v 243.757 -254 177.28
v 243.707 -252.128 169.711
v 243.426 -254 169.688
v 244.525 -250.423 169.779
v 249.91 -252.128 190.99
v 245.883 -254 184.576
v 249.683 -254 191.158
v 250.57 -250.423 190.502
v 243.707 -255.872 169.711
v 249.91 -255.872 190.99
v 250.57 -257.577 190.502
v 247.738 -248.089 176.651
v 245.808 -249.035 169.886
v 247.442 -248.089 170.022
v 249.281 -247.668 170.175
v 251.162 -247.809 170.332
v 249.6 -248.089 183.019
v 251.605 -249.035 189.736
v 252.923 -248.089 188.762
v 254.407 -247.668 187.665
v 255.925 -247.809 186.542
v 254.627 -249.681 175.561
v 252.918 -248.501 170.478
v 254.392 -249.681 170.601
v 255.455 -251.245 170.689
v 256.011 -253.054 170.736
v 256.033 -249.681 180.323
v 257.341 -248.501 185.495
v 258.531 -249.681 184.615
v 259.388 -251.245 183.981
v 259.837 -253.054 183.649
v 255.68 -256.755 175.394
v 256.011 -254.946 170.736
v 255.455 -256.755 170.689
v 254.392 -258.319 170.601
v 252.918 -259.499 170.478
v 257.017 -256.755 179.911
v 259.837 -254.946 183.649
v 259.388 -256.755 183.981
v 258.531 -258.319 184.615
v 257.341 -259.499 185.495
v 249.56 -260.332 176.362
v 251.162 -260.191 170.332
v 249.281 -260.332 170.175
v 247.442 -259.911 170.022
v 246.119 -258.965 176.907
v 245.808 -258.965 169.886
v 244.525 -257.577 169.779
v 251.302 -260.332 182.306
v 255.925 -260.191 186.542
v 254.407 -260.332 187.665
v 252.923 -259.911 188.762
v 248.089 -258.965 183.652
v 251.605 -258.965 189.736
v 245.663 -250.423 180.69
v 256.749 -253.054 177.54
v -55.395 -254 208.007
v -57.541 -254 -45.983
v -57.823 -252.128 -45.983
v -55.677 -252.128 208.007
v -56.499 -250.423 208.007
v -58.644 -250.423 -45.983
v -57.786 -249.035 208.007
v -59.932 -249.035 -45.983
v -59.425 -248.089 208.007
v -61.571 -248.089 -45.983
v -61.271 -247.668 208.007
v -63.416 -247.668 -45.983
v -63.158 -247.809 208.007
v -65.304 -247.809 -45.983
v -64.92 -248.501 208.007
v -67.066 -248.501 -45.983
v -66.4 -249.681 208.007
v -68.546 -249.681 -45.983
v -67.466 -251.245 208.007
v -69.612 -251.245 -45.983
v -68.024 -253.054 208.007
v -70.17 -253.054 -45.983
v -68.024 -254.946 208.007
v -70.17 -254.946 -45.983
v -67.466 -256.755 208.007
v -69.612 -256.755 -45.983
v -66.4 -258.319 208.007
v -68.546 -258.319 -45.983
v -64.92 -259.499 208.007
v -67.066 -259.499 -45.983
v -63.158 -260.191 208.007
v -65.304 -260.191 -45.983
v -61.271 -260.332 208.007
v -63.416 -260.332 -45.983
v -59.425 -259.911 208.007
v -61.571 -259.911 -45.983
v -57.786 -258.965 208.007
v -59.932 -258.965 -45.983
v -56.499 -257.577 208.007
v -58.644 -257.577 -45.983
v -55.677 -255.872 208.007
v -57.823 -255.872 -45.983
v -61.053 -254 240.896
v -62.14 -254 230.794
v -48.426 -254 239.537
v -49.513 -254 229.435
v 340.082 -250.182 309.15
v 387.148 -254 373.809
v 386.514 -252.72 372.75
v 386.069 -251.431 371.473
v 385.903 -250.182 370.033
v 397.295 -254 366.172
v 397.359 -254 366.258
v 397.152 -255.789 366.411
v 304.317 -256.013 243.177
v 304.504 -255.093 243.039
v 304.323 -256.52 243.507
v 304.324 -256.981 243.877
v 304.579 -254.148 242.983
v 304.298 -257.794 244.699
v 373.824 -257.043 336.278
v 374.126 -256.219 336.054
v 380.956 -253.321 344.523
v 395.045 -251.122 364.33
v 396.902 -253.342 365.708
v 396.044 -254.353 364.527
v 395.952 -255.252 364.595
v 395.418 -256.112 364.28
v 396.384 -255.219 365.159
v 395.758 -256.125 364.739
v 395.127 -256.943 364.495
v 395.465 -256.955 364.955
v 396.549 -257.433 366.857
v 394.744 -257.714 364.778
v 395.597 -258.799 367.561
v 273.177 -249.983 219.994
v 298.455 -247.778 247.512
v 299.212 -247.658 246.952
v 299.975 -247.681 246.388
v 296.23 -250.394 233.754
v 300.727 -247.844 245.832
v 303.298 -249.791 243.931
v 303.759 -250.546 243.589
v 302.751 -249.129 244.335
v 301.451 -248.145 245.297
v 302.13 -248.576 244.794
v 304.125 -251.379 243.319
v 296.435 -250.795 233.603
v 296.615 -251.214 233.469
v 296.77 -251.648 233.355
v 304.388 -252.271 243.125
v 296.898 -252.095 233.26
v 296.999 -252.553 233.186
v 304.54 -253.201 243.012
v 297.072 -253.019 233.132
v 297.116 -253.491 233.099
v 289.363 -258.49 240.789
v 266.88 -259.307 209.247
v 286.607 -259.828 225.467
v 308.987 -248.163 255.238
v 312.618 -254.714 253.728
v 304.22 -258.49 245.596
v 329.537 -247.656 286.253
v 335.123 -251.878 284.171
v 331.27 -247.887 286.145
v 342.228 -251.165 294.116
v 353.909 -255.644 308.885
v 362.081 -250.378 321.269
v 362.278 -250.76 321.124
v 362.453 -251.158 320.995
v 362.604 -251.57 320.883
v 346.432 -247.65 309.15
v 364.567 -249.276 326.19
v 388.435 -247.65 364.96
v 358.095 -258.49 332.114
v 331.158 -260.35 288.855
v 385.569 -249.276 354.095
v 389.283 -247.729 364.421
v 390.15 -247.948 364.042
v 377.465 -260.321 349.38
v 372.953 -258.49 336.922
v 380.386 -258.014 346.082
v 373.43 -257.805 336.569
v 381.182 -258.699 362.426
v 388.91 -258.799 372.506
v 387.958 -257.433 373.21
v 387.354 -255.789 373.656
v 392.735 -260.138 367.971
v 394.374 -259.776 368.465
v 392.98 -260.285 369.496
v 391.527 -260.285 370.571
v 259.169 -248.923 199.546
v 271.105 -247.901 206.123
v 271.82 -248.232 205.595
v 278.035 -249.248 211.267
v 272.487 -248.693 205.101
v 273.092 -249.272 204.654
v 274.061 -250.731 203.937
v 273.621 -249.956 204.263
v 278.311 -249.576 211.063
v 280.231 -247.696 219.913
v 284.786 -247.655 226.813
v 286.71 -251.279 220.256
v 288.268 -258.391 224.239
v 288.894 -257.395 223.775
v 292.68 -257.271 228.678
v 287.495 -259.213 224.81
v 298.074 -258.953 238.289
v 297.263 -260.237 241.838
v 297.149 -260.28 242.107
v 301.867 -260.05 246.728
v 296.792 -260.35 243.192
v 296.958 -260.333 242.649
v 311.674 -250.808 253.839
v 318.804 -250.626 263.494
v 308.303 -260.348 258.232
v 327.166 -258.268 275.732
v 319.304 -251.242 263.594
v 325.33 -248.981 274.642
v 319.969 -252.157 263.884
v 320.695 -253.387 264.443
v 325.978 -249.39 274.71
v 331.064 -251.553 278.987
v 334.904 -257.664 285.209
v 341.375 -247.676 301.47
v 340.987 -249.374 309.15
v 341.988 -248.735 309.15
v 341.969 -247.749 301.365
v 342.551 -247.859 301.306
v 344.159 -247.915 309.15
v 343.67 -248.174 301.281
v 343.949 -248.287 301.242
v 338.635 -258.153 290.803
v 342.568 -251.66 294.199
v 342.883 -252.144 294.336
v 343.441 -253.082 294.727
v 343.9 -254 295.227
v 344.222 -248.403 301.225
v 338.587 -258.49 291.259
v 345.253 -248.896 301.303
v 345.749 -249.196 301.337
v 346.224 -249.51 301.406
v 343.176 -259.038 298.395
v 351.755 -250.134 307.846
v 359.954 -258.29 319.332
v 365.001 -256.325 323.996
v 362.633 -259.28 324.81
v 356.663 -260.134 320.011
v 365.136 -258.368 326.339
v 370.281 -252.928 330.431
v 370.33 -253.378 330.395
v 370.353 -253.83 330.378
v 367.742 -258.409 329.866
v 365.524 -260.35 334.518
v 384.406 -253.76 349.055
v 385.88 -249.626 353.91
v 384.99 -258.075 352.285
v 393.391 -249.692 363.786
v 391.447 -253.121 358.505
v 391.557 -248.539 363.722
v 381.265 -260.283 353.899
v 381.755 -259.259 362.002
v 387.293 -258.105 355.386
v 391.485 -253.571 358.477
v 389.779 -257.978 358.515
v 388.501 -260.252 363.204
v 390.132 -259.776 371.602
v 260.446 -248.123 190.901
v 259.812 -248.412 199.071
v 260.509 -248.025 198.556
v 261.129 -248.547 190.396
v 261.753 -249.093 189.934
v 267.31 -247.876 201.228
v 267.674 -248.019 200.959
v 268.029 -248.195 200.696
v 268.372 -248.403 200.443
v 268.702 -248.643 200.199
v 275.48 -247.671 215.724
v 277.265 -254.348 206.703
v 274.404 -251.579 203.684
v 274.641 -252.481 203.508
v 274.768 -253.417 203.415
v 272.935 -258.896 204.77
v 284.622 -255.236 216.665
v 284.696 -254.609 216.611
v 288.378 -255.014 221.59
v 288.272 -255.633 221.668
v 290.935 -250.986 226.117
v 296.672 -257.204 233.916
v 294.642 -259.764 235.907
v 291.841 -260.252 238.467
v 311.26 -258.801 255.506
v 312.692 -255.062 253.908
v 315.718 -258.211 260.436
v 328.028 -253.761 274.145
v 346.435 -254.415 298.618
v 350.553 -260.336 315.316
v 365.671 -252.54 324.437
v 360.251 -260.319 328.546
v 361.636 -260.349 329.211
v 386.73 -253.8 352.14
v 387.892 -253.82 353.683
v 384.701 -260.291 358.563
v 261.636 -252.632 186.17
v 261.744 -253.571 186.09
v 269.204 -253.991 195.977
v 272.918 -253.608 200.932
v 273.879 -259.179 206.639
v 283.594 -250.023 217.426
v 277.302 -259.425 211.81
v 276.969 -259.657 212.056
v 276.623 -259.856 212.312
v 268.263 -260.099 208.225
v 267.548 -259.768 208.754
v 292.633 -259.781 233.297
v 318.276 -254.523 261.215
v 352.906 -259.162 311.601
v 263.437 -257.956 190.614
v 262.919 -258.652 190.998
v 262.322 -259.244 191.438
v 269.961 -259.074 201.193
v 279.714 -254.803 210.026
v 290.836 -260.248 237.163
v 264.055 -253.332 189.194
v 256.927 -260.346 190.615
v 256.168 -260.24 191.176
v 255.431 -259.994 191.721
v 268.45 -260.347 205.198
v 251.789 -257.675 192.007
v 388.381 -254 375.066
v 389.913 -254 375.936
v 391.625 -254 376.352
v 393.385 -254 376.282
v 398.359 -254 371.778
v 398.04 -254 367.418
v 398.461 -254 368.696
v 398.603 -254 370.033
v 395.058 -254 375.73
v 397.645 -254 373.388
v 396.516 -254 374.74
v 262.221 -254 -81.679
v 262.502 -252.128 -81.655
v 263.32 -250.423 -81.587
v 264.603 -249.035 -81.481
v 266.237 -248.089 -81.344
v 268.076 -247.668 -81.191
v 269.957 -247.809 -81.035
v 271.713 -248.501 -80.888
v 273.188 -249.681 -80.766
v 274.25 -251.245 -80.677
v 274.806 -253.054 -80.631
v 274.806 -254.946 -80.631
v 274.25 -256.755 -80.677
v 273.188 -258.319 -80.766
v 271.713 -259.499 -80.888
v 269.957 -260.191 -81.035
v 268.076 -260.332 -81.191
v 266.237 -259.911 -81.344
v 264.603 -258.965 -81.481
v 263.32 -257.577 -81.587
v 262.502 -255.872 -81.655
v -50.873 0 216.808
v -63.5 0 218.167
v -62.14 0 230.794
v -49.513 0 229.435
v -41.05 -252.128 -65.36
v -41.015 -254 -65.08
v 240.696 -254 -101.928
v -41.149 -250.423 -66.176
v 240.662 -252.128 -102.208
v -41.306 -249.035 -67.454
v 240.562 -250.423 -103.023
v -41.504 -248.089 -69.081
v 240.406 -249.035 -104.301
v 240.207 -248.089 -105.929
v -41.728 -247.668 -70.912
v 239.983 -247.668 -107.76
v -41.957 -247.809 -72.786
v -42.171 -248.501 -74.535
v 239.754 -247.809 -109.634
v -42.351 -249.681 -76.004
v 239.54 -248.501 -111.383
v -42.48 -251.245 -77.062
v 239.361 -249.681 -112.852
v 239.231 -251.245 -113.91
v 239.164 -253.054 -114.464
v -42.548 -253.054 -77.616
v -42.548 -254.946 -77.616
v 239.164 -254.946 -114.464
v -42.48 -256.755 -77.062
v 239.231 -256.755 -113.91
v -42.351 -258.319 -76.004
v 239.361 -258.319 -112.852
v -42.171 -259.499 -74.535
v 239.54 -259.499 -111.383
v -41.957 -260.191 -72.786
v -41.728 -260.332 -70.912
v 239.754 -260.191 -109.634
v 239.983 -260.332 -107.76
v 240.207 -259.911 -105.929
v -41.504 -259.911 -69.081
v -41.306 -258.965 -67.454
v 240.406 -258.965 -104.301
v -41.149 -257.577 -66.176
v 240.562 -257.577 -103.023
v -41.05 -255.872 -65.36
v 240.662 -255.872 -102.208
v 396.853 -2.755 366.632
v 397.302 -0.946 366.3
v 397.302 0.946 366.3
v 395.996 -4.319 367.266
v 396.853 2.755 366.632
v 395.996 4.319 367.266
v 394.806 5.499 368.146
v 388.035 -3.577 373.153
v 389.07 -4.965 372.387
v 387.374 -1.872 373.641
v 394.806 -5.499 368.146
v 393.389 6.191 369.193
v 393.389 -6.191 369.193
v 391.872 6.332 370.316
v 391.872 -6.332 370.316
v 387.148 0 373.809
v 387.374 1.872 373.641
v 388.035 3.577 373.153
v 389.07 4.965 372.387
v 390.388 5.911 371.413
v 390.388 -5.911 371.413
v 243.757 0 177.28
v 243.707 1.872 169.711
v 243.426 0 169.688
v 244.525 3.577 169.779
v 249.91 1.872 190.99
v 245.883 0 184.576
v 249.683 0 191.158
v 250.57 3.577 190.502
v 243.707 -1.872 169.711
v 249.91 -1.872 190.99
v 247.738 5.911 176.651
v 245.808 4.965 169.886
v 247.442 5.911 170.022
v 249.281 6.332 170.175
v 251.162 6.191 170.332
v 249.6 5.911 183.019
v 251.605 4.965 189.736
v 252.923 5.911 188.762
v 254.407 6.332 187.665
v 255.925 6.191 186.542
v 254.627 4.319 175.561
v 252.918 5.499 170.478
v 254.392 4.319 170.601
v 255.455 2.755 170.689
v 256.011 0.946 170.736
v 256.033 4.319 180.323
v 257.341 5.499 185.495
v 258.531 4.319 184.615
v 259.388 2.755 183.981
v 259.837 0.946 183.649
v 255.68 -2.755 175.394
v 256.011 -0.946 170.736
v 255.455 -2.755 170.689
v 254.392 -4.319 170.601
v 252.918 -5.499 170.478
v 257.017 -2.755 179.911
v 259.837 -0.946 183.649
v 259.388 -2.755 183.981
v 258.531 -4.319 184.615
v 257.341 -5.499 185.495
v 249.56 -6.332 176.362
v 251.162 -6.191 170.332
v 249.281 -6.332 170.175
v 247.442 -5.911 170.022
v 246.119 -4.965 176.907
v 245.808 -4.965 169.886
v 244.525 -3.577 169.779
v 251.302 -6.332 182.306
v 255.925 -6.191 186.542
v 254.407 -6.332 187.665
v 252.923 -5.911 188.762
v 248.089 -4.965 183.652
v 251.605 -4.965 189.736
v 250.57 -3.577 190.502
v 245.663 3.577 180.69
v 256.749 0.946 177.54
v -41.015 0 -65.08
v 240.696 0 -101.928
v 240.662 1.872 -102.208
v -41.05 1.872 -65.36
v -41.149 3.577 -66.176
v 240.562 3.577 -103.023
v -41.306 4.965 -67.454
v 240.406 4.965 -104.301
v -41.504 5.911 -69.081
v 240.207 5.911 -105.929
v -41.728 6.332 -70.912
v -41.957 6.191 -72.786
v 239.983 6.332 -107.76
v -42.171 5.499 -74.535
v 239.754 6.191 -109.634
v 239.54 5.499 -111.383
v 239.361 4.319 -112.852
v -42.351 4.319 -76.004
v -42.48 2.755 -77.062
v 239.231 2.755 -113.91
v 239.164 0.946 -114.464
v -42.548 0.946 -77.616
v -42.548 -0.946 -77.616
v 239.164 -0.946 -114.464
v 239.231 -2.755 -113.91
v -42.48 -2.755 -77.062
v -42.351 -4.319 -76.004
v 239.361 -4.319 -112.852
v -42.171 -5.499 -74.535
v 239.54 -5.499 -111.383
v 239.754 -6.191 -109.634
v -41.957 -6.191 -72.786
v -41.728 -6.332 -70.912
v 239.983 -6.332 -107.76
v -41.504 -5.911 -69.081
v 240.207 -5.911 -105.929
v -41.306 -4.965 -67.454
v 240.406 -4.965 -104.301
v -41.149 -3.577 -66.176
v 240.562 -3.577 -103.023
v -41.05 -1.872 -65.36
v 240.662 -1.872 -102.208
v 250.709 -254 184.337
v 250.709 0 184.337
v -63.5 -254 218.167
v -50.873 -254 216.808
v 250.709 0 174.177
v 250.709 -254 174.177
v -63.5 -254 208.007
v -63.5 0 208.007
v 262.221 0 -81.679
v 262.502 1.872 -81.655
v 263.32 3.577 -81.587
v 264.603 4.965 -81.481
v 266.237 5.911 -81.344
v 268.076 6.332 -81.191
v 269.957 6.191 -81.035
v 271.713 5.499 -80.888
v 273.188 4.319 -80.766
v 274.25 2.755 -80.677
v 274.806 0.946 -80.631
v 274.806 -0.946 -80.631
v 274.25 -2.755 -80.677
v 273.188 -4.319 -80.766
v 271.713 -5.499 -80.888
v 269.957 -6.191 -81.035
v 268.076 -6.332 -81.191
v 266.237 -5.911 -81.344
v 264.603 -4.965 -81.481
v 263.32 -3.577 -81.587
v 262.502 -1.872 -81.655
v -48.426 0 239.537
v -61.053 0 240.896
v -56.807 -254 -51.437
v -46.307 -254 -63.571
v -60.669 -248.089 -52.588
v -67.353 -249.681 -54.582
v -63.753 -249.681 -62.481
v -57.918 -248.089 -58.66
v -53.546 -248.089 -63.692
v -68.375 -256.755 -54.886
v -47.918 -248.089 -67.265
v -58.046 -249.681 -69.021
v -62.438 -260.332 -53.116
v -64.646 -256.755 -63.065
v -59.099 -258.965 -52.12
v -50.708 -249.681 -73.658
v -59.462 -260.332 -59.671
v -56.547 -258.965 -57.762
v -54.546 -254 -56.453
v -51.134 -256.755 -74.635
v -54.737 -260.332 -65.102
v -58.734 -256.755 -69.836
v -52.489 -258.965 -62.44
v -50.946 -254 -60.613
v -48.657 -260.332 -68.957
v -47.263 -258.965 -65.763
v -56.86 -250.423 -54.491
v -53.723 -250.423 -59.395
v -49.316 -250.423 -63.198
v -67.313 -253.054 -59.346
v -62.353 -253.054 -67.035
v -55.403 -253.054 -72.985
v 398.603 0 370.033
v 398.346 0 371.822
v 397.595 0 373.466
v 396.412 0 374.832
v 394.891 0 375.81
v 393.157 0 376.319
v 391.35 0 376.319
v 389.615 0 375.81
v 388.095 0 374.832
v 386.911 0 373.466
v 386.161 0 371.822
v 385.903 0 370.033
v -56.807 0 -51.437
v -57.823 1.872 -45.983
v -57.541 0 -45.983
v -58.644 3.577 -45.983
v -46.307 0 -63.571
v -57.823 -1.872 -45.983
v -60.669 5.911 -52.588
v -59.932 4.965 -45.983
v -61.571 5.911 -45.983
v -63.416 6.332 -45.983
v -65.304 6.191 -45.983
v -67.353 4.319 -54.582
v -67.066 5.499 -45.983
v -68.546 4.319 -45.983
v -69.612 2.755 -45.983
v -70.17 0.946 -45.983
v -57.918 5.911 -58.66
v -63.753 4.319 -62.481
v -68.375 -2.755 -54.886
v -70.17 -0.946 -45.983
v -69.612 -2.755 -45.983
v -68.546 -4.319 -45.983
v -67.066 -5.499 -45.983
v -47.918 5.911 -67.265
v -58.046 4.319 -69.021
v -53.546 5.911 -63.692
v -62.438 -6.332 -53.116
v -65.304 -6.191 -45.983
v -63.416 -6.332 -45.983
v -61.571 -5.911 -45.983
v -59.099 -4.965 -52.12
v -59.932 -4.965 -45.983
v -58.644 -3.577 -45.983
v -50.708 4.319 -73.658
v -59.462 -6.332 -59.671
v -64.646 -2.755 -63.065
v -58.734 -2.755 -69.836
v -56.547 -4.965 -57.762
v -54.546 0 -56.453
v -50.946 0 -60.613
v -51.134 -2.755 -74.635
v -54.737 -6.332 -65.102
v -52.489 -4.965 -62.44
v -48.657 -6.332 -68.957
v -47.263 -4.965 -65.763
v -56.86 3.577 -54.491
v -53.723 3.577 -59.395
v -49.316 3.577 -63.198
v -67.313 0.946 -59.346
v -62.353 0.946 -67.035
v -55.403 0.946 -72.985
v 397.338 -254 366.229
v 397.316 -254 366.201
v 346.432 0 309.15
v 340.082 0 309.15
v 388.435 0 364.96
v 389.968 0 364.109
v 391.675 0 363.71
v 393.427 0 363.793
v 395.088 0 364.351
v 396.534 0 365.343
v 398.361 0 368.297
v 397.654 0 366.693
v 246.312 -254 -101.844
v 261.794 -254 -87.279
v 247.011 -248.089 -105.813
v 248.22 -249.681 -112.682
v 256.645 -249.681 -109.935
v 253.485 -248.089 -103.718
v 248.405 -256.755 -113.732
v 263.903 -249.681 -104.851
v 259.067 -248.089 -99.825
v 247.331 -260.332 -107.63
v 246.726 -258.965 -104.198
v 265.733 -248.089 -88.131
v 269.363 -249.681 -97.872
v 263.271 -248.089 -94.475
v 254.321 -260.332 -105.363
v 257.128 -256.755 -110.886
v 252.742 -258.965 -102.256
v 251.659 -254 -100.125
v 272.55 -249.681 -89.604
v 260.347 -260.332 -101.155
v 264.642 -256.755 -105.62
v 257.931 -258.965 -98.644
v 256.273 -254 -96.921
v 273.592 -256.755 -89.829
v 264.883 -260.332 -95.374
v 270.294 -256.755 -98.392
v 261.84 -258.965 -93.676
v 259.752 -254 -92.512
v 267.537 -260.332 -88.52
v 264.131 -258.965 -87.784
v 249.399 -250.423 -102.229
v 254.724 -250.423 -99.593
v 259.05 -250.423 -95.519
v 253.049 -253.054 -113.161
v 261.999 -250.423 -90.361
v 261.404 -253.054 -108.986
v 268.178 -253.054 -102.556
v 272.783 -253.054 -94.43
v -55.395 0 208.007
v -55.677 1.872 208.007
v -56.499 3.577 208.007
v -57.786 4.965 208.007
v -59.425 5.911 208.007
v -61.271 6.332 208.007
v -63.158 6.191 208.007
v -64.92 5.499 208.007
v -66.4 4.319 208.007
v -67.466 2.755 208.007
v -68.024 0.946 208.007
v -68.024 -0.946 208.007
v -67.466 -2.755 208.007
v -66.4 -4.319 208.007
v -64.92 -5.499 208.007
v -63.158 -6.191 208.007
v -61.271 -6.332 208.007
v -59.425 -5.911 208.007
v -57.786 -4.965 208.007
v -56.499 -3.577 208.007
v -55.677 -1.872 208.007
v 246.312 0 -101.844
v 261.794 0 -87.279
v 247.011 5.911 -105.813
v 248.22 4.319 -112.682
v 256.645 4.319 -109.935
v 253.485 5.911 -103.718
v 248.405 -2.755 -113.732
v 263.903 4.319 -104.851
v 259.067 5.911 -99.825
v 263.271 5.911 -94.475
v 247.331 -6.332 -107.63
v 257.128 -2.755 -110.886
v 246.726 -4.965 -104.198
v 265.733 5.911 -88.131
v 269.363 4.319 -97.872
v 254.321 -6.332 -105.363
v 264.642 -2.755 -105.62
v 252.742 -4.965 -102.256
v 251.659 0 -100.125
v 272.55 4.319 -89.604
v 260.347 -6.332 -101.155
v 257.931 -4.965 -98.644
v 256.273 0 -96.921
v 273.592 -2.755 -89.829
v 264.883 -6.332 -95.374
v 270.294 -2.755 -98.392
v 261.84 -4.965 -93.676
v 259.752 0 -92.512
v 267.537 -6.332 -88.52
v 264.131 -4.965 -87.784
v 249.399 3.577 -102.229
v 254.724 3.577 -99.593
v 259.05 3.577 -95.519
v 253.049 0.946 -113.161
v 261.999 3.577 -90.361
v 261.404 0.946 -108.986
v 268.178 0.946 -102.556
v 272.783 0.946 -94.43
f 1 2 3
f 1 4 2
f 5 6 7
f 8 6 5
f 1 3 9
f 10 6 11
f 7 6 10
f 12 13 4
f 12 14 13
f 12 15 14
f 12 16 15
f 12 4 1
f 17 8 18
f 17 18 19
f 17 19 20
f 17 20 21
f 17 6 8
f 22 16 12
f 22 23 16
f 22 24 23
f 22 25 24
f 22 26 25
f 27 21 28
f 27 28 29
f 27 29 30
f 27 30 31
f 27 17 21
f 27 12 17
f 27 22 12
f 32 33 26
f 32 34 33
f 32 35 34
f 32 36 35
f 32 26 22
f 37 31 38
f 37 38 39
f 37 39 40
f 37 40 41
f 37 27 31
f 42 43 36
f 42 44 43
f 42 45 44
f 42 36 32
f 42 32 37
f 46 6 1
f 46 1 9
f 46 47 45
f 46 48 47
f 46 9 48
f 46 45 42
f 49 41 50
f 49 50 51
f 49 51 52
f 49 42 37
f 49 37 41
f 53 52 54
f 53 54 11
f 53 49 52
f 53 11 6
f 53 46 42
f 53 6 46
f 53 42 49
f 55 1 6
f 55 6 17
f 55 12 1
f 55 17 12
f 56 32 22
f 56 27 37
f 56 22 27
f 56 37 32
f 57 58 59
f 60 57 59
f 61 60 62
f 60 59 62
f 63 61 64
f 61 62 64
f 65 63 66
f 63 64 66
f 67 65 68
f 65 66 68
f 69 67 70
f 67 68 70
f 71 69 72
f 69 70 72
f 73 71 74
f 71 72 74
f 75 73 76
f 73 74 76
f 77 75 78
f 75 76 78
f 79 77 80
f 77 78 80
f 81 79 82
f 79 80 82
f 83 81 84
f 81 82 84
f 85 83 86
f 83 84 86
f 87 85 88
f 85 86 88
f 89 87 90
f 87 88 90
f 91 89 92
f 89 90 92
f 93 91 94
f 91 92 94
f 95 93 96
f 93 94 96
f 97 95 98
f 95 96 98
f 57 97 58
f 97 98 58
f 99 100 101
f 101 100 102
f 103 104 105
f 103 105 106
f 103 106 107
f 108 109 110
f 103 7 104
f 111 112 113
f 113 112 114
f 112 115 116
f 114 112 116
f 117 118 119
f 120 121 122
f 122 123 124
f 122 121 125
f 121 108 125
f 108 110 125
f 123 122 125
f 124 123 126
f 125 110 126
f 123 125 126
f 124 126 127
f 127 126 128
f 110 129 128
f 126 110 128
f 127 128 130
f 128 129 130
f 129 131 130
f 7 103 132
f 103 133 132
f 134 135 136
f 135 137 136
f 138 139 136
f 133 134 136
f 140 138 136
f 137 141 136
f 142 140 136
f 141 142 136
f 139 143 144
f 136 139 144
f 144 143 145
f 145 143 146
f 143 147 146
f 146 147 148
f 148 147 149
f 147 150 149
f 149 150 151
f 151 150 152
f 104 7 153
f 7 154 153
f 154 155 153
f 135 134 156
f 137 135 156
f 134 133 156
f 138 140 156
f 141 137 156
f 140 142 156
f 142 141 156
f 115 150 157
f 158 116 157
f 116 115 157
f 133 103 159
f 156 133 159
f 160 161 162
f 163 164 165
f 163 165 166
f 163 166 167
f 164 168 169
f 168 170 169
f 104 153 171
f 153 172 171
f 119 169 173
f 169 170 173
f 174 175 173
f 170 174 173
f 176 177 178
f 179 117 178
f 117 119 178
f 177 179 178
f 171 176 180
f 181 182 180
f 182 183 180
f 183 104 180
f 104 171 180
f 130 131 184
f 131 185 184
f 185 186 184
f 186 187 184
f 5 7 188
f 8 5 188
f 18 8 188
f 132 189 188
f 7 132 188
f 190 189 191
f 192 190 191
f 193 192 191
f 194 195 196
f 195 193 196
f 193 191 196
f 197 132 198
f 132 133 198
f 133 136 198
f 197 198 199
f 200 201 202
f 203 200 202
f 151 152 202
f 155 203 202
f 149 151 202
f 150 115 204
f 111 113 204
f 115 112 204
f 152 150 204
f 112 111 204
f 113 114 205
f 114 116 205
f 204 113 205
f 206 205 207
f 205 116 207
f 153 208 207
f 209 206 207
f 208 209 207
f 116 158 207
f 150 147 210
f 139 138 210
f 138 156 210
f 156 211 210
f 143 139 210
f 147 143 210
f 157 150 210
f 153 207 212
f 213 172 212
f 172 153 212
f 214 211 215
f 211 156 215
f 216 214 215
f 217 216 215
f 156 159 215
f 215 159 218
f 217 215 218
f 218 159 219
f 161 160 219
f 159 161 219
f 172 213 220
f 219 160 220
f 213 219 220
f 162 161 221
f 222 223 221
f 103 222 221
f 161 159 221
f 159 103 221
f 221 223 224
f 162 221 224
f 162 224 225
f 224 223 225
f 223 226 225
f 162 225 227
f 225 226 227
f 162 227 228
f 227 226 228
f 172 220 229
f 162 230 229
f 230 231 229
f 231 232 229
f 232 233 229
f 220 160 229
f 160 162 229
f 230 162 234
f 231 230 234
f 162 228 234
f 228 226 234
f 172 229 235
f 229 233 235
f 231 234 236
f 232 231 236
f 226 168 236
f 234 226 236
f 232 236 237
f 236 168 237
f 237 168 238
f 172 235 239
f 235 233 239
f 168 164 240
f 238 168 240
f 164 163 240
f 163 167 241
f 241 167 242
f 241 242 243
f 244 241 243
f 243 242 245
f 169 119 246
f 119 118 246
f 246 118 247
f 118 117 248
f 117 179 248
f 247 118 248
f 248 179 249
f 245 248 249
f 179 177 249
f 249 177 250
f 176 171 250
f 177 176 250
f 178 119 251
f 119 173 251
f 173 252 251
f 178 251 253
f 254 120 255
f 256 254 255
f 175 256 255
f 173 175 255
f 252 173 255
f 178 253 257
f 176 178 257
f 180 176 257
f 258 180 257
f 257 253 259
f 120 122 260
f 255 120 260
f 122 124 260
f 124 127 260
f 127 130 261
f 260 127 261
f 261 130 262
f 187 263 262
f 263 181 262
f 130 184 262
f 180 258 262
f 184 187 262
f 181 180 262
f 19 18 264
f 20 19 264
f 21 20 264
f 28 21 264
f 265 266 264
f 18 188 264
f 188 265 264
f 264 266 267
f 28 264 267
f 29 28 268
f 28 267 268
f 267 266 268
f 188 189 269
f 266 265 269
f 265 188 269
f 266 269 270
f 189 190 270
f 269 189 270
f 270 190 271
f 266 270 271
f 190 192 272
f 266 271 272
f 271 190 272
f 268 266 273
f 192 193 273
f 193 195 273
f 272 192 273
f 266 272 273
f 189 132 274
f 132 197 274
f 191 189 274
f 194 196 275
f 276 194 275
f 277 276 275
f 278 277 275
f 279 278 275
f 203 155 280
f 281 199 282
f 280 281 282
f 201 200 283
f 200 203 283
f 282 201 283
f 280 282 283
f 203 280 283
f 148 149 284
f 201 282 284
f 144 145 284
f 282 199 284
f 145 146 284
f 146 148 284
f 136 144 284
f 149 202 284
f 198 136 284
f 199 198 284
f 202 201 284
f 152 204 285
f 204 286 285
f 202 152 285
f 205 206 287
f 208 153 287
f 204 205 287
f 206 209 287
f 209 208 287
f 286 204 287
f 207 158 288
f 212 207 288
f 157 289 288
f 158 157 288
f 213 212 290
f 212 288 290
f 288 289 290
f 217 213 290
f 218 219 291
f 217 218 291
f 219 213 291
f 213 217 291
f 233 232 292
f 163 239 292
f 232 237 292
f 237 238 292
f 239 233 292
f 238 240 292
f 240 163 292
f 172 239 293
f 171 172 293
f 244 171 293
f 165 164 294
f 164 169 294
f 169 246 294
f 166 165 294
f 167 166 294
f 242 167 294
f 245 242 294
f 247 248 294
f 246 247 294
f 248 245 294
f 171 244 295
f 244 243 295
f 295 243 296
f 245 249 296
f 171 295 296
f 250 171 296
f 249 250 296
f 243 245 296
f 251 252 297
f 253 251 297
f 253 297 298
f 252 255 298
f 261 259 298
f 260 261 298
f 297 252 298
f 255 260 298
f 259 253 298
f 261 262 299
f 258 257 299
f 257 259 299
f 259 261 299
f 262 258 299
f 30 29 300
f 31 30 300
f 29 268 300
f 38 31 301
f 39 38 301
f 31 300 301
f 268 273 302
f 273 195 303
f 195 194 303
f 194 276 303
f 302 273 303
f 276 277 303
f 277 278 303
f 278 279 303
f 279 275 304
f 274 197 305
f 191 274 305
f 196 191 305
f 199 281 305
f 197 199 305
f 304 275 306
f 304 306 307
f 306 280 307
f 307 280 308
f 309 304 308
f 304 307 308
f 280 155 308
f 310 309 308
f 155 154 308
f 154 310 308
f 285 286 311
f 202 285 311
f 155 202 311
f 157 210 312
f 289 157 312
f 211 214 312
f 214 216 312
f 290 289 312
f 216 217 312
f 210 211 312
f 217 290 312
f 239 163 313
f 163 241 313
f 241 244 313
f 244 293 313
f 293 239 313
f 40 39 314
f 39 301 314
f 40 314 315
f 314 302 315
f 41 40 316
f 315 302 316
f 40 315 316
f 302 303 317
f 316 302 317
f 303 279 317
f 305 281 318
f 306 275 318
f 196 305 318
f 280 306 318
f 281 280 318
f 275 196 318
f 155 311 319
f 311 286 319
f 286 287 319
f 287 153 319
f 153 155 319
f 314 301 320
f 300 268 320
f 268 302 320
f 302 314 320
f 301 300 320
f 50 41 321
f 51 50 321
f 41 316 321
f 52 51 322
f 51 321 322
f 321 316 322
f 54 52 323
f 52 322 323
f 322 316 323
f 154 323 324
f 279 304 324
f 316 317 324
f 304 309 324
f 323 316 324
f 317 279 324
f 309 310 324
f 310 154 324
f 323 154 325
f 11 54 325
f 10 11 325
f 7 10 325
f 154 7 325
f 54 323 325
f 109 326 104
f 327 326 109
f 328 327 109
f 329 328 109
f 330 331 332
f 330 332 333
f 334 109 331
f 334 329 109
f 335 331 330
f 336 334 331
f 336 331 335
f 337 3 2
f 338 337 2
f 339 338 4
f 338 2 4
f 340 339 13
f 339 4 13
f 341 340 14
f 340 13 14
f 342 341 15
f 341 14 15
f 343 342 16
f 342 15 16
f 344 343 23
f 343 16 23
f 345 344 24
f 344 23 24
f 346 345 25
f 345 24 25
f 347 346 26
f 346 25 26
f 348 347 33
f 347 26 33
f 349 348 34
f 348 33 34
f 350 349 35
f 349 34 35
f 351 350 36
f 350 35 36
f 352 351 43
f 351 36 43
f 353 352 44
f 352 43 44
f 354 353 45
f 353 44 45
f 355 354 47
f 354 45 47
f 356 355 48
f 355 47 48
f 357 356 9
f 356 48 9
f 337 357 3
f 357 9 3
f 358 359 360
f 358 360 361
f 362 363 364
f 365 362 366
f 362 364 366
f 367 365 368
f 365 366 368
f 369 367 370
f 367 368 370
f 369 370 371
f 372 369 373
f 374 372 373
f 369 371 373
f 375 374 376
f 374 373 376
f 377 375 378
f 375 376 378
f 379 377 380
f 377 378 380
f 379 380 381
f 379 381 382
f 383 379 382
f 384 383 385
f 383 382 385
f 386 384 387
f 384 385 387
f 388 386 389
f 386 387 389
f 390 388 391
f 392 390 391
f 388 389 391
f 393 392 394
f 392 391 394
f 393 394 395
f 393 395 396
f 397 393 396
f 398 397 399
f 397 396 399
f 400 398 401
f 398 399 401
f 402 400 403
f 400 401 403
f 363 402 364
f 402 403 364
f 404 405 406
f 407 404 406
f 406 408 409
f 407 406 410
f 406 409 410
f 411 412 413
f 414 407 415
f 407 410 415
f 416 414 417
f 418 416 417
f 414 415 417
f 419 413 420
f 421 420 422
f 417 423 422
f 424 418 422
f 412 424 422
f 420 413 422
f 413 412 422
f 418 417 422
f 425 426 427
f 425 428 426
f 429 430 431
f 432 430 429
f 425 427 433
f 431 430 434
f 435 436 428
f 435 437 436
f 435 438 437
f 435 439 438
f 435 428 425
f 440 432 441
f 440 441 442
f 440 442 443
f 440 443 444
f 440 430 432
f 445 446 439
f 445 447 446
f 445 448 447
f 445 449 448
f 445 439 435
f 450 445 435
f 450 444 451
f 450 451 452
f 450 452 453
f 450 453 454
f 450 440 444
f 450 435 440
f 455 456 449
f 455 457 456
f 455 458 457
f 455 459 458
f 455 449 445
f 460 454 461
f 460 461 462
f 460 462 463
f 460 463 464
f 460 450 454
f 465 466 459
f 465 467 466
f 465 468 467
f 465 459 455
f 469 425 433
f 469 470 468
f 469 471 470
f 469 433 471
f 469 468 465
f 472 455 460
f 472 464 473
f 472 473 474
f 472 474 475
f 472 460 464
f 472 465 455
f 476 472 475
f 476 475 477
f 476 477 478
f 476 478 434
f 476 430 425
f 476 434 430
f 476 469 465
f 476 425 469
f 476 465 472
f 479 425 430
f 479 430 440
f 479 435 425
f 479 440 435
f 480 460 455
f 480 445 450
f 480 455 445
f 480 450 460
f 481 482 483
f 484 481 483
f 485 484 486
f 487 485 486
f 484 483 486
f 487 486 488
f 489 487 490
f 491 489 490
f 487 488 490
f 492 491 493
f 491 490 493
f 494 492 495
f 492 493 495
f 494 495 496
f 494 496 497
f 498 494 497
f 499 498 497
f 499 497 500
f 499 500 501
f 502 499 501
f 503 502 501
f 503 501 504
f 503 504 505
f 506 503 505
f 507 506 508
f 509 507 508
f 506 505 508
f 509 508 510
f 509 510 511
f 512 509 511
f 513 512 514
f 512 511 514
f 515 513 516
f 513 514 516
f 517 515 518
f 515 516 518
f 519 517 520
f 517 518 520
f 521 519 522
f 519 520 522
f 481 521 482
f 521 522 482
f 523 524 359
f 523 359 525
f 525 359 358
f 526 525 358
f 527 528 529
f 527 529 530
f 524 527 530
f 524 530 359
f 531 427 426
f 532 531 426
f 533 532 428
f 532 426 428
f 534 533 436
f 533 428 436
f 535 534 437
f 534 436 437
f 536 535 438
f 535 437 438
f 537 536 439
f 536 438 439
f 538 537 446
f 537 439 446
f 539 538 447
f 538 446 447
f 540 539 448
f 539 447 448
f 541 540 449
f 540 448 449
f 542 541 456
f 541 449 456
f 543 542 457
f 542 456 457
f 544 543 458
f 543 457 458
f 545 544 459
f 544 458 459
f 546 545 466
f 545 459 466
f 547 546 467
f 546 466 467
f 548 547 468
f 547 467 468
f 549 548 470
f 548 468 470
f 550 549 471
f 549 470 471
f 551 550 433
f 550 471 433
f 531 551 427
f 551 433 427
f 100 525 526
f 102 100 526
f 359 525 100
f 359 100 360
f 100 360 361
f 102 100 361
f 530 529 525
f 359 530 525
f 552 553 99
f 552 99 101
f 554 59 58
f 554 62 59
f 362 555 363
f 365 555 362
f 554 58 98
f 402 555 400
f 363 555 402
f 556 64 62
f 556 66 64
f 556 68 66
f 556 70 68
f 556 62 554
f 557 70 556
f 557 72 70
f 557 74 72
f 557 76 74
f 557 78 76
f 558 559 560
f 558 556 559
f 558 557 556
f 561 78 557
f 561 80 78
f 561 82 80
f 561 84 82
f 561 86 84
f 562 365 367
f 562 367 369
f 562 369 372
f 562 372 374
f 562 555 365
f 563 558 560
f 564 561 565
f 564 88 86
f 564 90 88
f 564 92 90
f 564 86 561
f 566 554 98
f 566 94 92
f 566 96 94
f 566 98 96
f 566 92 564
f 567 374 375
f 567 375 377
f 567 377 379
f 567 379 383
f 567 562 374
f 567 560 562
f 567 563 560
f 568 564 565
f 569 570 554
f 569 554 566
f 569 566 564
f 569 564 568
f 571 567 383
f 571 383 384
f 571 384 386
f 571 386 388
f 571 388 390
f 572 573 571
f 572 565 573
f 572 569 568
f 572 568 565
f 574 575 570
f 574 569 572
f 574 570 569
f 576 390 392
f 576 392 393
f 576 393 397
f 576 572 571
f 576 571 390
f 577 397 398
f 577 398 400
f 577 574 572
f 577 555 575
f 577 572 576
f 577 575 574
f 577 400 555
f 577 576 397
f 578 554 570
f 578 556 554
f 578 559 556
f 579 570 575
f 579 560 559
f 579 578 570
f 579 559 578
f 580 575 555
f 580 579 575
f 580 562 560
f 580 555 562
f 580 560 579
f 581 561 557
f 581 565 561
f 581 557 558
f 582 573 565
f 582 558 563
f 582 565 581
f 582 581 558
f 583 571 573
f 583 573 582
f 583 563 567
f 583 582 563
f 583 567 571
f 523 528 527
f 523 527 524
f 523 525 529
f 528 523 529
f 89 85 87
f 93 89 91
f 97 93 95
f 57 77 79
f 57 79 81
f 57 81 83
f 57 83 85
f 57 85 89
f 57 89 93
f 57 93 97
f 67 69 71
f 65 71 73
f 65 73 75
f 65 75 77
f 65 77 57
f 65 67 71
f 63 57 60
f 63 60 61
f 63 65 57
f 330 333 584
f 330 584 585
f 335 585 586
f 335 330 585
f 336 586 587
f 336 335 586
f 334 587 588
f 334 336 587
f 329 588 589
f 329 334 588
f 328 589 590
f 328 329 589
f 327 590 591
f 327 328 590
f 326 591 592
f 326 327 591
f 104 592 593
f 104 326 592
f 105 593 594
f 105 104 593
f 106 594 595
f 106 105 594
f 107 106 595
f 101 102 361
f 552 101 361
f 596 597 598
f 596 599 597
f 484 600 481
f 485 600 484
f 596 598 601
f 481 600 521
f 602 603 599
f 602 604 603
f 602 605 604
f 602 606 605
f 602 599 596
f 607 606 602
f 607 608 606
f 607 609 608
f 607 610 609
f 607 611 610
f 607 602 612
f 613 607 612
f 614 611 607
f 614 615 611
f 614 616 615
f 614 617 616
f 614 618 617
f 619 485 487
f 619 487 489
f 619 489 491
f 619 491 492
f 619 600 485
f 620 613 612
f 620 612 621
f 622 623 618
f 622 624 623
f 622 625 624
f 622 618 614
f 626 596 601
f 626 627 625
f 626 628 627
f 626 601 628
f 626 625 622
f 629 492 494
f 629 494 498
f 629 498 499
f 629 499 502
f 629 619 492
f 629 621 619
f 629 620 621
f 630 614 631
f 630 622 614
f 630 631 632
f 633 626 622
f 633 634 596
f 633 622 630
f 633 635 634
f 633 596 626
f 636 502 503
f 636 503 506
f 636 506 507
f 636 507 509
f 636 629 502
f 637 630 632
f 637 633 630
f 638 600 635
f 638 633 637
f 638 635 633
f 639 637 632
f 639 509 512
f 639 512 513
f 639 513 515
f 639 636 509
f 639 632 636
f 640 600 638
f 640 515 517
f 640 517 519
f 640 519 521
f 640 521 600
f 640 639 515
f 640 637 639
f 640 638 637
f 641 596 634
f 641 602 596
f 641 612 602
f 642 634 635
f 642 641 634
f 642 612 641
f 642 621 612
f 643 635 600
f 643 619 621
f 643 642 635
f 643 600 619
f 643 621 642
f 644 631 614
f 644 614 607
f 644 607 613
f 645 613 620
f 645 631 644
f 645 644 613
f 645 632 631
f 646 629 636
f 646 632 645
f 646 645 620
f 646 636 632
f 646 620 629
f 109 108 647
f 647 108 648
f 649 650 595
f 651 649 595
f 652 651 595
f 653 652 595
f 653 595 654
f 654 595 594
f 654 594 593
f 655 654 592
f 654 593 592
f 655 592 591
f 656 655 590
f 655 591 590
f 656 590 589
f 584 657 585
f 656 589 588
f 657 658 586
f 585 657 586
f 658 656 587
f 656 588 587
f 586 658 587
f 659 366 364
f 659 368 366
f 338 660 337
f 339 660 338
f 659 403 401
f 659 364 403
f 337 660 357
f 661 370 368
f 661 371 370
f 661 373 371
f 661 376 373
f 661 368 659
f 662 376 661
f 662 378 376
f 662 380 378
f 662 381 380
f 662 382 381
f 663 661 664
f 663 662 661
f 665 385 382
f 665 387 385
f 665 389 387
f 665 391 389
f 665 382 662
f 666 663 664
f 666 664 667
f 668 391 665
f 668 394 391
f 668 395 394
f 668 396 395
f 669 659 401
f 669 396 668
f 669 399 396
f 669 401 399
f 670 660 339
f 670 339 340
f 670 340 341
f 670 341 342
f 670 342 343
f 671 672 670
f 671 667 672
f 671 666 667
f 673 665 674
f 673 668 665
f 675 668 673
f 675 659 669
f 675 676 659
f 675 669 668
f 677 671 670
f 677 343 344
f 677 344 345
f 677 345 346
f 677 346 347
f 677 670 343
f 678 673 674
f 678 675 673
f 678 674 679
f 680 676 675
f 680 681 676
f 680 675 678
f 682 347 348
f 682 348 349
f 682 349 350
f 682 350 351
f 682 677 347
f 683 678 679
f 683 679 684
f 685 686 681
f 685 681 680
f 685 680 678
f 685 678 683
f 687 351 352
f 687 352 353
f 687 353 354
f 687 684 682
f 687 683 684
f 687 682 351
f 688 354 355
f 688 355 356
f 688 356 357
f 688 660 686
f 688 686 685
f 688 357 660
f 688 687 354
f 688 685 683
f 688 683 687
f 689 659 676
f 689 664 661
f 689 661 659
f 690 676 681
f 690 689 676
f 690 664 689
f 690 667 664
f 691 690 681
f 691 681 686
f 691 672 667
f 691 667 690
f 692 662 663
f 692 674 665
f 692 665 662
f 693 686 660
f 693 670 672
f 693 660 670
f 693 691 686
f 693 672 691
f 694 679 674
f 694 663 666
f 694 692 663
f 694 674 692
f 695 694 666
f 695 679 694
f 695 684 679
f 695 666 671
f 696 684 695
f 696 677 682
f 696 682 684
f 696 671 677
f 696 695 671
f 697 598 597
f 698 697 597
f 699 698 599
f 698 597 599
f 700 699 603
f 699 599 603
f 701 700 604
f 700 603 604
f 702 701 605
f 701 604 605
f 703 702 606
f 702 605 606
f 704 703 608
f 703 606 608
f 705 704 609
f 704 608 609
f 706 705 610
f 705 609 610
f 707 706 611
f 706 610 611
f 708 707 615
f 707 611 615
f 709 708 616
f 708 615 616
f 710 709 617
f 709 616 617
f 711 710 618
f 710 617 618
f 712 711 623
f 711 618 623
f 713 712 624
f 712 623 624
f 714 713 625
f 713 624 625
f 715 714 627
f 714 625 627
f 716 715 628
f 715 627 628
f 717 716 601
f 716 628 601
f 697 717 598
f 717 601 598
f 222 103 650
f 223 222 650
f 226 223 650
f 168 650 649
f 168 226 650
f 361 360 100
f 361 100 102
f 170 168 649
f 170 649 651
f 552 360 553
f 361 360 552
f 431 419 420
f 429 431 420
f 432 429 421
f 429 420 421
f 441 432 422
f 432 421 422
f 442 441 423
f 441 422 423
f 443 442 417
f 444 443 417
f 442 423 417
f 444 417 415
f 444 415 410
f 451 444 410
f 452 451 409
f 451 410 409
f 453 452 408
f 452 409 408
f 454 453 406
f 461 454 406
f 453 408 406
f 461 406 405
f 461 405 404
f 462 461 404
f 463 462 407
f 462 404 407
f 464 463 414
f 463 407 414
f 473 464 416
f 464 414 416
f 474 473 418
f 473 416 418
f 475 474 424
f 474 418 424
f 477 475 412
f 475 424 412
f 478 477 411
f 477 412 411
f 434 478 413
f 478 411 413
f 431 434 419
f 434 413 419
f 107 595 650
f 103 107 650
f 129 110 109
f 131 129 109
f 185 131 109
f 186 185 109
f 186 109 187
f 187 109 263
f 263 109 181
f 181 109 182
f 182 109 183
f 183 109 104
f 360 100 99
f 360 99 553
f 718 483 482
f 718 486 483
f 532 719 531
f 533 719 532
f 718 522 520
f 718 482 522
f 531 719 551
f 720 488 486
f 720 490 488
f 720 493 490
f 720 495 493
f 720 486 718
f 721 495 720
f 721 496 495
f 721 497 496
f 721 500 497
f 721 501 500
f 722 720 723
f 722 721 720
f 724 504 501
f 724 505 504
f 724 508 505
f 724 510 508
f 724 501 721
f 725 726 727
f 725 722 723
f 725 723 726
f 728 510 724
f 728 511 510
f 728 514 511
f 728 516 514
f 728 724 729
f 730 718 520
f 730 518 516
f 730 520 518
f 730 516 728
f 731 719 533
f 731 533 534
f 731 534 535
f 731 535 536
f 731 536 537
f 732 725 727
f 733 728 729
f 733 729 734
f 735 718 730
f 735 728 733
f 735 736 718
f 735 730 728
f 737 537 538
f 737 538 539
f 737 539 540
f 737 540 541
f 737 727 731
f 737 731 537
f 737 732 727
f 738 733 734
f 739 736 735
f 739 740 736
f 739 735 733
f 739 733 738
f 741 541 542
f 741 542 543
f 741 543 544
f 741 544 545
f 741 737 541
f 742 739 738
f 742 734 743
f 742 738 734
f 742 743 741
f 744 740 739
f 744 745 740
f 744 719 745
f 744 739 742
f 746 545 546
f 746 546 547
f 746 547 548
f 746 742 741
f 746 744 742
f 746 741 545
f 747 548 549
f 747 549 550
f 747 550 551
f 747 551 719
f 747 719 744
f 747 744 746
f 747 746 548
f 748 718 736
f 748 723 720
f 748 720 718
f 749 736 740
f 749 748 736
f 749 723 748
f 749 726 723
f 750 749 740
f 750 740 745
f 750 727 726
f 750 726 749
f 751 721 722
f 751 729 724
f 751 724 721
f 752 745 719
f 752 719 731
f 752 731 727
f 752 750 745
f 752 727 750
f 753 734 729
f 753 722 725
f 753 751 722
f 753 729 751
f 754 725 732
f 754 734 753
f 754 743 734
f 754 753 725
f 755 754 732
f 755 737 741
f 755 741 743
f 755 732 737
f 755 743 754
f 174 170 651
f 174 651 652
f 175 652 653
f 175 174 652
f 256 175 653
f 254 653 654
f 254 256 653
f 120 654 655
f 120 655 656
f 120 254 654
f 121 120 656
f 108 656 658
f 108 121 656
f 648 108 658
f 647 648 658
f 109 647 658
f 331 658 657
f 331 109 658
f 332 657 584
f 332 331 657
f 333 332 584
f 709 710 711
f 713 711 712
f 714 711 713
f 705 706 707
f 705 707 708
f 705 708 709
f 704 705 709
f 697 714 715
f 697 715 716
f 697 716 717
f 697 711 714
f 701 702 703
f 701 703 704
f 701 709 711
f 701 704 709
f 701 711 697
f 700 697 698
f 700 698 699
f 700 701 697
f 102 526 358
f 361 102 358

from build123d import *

# Parameters (mm, degrees)
F4_R      = 6.35
F6_R      = 6.35
F8_DEPTH  = 254
F10_W     = 254
F10_H     = 10.16
F14_DEPTH = 254
F15_W     = 12.7
F15_H     = 254
F16_DEPTH = 12.7
F17_W     = 12.7
F17_H     = 254
F18_DEPTH = 10.16


with BuildPart() as f5:
    # F5: sweep along a path in F1
    with BuildLine(Plane.XZ) as f5_path:
        Line((-61.7453475377, 208.0074561836), (-63.8906607053, -45.9834838741))
        ThreePointArc((-63.8906607053, -45.9834838741), (-57.6518689096, -62.872631205), (-41.7858294707, -71.3834838741))
        Line((-41.7858294707, -71.3834838741), (239.9254137755, -108.2313532754))
        ThreePointArc((239.9254137755, -108.2313532754), (260.675596222, -101.4971953394), (268.5489681957, -81.1519509704))
        Line((268.5489681957, -81.1519509704), (249.7536663039, 170.2146638692))
        ThreePointArc((249.7536663039, 170.2146638692), (250.7094665663, 179.2565284944), (254.7884130124, 187.38247865))
        Line((254.7884130124, 187.38247865), (392.253343443, 370.0333831145))
    # F4 (on offset) → F5 (sweep)
    with BuildSketch(Plane.XY.offset(208.007458)):
        with Locations((-61.7453475377, 0)):
            Circle(F4_R)
    sweep(path=f5_path.line)


with BuildPart() as f7:
    # F7: sweep along a path in F2
    with BuildLine(Plane.XZ.offset(254)) as f7_path:
        Line((-61.7453475377, 208.0074561836), (-63.8906607053, -45.9834838741))
        ThreePointArc((-63.8906607053, -45.9834838741), (-57.6518689096, -62.872631205), (-41.7858294707, -71.3834838741))
        Line((-41.7858294707, -71.3834838741), (239.9254137755, -108.2313532754))
        ThreePointArc((239.9254137755, -108.2313532754), (260.675596222, -101.4971953394), (268.5489681957, -81.1519509704))
        Line((268.5489681957, -81.1519509704), (249.7536663039, 170.2146638692))
        ThreePointArc((249.7536663039, 170.2146638692), (250.7094665663, 179.2565284944), (254.7884130124, 187.38247865))
        Line((254.7884130124, 187.38247865), (392.253343443, 370.0333831145))
    # F6 (on offset) → F7 (sweep)
    with BuildSketch(Plane.XY.offset(208.007458)):
        with Locations((-61.7453475377, -254)):
            Circle(F6_R)
    sweep(path=f7_path.line)

    # F2 (on offset) → F8 (join)
    with BuildSketch(Plane.XZ.offset(254)):
        with BuildLine():
            ThreePointArc((388.4348731532, 364.9597468793), (395.0884107843, 364.3514034269), (398.603343443, 370.0333831145))
            ThreePointArc((398.603343443, 370.0333831145), (389.4182761016, 375.715362802), (388.4348731532, 364.9597468793))
        make_face()
    extrude(amount=-F8_DEPTH)

    # F13 (on face) → F14 (join)
    with BuildSketch(Plane.XZ.offset(254)):
        Polygon((392.253343443, 370.0333831145), (385.903343443, 370.0333831145), (340.0816999661, 309.149748293), (346.4316999661, 309.149748293), align=None)
    extrude(amount=-F14_DEPTH)


with BuildPart() as f12:
    # F12: sweep along a path in F11
    with BuildLine(Plane.XZ) as f12_path:
        Line((-63.5, 213.0874561836), (250.7094665663, 179.2565284944))
    # F10 (on offset) → F12 (sweep)
    with BuildSketch(Plane.YZ.offset(-63.5)):
        with Locations((-127, 213.0874561836)):
            Rectangle(F10_W, F10_H)
    sweep(path=f12_path.line)


with BuildPart() as f16:
    # F15 (on face) → F16 (new body)
    with BuildSketch(Plane(origin=(22.4931822163, 0, 208.9085717804), x_dir=(0.9942535031, 0, -0.107051257), z_dir=(0.107051257, 0, 0.9942535031))):
        with Locations((-80.1401978729, -127)):
            Rectangle(F15_W, F15_H)
    extrude(amount=F16_DEPTH)


with BuildPart() as f18:
    # F17 (on face) → F18 (new body)
    with BuildSketch(Plane(origin=(23.8527331806, 0, 221.5355912694), x_dir=(0.9942535031, 0, -0.107051257), z_dir=(0.107051257, 0, 0.9942535031))):
        with Locations((-80.1401978729, -127)):
            Rectangle(F17_W, F17_H)
    extrude(amount=F18_DEPTH)


solid = Compound([f5.part, f7.part, f12.part, f16.part, f18.part])
